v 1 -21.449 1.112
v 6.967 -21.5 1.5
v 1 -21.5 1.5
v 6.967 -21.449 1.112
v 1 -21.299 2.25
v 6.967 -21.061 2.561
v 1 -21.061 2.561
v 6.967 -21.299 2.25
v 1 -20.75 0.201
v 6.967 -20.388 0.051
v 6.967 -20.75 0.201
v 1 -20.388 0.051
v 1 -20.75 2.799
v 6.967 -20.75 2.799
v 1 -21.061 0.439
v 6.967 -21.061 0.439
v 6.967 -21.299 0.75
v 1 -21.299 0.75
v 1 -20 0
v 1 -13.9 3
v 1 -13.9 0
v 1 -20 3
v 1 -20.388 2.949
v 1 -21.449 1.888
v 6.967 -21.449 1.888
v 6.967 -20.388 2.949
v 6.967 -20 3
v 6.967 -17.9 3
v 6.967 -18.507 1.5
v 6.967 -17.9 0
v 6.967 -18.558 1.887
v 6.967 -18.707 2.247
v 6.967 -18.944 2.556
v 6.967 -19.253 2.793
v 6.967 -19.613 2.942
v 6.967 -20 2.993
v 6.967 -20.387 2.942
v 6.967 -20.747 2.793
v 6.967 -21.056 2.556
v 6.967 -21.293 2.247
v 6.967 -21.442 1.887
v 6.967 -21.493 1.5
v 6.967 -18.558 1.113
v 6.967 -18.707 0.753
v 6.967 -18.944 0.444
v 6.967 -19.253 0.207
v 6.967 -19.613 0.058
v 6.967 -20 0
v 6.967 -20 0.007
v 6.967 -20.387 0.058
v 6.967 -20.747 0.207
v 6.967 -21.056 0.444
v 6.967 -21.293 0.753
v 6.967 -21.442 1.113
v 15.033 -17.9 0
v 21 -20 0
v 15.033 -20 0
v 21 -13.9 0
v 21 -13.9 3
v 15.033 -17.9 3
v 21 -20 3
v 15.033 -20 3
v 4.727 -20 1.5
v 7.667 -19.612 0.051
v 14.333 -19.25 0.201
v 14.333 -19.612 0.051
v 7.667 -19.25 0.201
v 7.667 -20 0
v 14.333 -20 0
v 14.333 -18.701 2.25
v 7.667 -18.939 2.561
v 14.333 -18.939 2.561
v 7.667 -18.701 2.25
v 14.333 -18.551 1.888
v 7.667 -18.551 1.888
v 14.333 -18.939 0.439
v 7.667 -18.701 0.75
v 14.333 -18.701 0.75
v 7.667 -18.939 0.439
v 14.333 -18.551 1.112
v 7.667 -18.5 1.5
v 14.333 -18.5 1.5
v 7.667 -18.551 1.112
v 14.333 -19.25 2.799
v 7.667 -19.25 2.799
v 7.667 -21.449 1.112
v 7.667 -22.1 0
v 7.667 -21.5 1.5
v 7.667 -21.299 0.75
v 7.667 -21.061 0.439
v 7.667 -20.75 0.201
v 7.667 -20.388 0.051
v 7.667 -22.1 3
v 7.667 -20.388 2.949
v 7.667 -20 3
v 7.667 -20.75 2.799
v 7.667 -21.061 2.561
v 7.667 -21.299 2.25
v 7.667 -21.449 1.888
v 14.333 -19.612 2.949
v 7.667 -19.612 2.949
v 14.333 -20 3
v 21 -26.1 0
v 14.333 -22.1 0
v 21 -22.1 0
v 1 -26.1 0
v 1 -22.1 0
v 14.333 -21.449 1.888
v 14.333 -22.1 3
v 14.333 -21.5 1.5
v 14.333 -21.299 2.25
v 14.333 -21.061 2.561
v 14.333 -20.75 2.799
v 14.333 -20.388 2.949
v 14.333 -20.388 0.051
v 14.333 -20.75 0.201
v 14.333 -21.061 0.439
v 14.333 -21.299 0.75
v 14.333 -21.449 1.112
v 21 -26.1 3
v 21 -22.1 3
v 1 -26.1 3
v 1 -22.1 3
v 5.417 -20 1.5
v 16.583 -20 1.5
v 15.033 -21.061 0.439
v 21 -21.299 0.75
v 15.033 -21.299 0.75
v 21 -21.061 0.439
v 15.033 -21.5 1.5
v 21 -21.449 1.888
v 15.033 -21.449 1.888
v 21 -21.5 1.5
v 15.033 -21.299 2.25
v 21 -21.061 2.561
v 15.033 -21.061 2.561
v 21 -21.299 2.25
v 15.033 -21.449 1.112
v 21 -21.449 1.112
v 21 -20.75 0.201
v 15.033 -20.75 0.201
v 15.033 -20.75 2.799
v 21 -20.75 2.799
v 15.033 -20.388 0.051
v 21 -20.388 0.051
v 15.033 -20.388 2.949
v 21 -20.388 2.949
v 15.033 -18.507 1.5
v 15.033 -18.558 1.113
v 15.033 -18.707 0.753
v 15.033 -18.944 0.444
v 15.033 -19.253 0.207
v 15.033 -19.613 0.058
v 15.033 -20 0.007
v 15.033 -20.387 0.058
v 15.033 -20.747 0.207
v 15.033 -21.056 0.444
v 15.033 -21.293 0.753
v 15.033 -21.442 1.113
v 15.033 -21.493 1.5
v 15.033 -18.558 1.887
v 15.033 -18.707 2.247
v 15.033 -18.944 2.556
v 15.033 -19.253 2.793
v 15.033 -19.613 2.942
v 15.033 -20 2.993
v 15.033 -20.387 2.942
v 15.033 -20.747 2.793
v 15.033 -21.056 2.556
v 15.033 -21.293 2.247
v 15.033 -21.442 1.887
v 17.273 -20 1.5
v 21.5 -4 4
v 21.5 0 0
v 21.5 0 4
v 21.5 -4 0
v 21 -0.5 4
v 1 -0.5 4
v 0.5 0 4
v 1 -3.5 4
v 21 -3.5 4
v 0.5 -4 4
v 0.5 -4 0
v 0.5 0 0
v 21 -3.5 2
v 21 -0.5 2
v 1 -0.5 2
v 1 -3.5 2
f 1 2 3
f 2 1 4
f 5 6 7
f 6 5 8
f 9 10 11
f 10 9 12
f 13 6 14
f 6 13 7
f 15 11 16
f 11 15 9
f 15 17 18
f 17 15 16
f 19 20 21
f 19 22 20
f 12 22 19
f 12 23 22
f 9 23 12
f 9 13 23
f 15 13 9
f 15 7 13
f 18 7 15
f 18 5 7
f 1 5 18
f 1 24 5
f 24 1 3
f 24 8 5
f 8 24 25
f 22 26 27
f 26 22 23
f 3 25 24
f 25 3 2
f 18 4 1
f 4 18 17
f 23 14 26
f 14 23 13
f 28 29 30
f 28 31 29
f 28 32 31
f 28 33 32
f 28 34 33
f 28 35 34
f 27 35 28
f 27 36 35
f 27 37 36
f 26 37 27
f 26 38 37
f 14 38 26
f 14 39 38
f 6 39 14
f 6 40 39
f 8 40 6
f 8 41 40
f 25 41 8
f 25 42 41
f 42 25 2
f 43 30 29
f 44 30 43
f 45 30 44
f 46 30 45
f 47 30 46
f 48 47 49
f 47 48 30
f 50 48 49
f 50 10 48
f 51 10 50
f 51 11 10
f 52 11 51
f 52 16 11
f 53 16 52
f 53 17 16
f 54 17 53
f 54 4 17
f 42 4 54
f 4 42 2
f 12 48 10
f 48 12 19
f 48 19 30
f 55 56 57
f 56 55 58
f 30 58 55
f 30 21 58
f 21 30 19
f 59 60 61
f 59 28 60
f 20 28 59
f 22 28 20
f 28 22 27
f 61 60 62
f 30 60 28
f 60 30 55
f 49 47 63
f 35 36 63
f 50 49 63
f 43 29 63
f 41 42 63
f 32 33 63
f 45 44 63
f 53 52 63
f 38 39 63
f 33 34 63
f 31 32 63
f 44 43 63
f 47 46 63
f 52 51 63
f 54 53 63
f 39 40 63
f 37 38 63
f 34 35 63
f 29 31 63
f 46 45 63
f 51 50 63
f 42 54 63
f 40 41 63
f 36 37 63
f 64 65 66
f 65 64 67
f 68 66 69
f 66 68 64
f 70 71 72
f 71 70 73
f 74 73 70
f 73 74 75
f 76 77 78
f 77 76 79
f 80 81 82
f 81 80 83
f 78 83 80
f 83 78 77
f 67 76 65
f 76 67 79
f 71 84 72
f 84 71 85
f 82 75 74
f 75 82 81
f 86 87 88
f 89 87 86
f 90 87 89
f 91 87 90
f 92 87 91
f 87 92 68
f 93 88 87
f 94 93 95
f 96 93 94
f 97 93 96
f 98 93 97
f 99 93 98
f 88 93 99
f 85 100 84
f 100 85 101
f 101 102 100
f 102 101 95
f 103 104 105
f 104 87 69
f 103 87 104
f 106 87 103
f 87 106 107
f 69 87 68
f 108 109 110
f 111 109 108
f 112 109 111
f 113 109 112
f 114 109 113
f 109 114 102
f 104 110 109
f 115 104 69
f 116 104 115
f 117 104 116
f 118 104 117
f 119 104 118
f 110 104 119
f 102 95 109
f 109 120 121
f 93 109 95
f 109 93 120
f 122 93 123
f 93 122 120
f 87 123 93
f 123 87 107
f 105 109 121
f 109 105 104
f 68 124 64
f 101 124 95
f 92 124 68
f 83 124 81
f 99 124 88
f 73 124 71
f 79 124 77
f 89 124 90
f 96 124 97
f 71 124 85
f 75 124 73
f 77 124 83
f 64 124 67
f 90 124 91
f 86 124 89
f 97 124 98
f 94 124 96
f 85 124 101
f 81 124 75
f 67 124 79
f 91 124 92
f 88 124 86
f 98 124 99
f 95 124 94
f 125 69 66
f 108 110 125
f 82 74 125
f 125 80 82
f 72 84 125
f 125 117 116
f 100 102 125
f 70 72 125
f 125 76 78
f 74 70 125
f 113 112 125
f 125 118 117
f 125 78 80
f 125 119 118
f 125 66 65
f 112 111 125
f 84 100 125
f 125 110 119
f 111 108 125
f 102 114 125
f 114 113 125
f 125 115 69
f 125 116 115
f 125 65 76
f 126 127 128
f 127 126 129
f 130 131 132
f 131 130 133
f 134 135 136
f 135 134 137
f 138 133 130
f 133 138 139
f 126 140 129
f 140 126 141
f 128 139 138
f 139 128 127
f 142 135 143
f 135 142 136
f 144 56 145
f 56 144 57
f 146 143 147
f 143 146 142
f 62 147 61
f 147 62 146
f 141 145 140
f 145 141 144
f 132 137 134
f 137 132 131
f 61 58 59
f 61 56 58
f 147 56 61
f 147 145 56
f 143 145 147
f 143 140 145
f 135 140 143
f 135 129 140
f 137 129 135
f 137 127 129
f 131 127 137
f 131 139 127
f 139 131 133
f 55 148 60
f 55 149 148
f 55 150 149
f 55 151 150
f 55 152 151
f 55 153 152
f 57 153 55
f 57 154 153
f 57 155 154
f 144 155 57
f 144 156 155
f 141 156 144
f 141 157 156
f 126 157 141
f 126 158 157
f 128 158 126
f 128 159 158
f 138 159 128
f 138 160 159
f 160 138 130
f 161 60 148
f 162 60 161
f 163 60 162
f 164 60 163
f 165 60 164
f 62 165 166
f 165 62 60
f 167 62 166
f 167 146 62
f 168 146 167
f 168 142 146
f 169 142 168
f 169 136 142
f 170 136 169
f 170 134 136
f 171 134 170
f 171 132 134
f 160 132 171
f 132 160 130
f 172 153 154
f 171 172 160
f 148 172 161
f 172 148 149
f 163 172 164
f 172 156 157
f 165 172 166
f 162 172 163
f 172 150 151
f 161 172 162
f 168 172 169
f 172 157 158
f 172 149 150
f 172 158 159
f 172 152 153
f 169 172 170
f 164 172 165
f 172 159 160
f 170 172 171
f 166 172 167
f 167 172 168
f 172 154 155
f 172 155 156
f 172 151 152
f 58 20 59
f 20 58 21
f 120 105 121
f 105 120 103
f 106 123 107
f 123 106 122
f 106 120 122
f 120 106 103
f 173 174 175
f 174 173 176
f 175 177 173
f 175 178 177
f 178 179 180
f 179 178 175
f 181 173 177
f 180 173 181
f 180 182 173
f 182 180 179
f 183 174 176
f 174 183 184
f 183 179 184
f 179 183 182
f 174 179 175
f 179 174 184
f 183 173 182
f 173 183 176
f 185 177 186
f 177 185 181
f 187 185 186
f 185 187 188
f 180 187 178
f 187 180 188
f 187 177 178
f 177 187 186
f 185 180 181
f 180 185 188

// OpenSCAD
// file: mathhinge.scad
module math_hinge(){// mathgrrl cone hinge

//////////////////////////////////////////////////////
// parameters

// Length of the complete hinge
length = 20;

// Height (diameter) of the hinge
height = 3;

// Clearance between cones and holes
clearance = .7;		

// Clearance between hinge and sides
gap = .6; 				

// Parameters that the user does not get to specify
$fn=24*1;
border = 2*1; 
fudge = .01*1;			// to preserve mesh integrity
corner = 0*1;      	// space between hinge and corner
hinge_radius = height/2;
cone_height = 1.5*hinge_radius;  

//////////////////////////////////////////////////////
// renders

rotate(90,[0,1,0]) 
	translate([-hinge_radius,0,0])
		hinge();

translate([0,hinge_radius+gap,0]) bar();
translate([0,-2*border-hinge_radius-gap,0]) bar();

//translate([0,hinge_radius+gap,0]) square();
//translate([0,-length-hinge_radius-gap,0]) square();


//////////////////////////////////////////////////////
// module for hinge

module hinge(){
	rad = hinge_radius;
	clr = clearance;
	len = (length-2*corner)/3; 
	con = cone_height;
	// left outside hinge = (cylinder+box)-cone
	difference(){
		union(){
			translate([0,0,corner]) cylinder(h=len-clr,r=rad);
			translate([-rad,0,corner]) cube([2*rad,rad+gap,len-clr]);
		}
		translate([0,0,corner+len-con-clr+fudge]) cylinder(h=con,r1=0,r2=rad);
	}
	// inside hinge = cylinder+box+cone+cone
	union(){
		translate([0,0,corner+len]) cylinder(h=len,r=rad);
		translate([-rad,-rad-gap,corner+len]) cube([2*rad,rad+gap,len]);
		translate([0,0,corner+len-con]) cylinder(h=con,r1=0,r2=rad);
		translate([0,0,corner+2*len]) cylinder(h=con,r1=rad,r2=0);
	}
	// right outside hinge = (cylinder+box)-cone
	difference(){
		union(){
			translate([0,0,corner+2*len+clr]) cylinder(h=len-clr,r=rad);
			translate([-rad,0,corner+2*len+clr]) cube([2*rad,rad+gap,len-clr]);
		}
		translate([0,0,corner+2*len+clr-fudge]) cylinder(h=con,r1=rad,r2=0);	
	}
}

//////////////////////////////////////////////////////
// module for square shape

module square(){
	difference(){
		cube([length,length,height]);
		translate([border,border,-fudge])
			cube(	[length-2*border,length-2*border,height+2*fudge]);
	}
}

//////////////////////////////////////////////////////
// module for bar shape

module bar(){
	cube([length,2*border,height]);
}
}
math_hinge();
// main file
use <mathhinge.scad>;

module hinge(){
translate([1, -10, 0]) scale([1,1,1]) math_hinge();
}

module box(){
	difference(){
		cube([21, 4, 4], center=true);
		translate([0,0,2]) cube([20, 3, 4], center=true);
	}
}


translate([0, -10, 0])  hinge();
translate([11, -2, 2]) box();

//for comparison
//translate([1, -4, 0]) color("red") cube([20, 4, 3]);
